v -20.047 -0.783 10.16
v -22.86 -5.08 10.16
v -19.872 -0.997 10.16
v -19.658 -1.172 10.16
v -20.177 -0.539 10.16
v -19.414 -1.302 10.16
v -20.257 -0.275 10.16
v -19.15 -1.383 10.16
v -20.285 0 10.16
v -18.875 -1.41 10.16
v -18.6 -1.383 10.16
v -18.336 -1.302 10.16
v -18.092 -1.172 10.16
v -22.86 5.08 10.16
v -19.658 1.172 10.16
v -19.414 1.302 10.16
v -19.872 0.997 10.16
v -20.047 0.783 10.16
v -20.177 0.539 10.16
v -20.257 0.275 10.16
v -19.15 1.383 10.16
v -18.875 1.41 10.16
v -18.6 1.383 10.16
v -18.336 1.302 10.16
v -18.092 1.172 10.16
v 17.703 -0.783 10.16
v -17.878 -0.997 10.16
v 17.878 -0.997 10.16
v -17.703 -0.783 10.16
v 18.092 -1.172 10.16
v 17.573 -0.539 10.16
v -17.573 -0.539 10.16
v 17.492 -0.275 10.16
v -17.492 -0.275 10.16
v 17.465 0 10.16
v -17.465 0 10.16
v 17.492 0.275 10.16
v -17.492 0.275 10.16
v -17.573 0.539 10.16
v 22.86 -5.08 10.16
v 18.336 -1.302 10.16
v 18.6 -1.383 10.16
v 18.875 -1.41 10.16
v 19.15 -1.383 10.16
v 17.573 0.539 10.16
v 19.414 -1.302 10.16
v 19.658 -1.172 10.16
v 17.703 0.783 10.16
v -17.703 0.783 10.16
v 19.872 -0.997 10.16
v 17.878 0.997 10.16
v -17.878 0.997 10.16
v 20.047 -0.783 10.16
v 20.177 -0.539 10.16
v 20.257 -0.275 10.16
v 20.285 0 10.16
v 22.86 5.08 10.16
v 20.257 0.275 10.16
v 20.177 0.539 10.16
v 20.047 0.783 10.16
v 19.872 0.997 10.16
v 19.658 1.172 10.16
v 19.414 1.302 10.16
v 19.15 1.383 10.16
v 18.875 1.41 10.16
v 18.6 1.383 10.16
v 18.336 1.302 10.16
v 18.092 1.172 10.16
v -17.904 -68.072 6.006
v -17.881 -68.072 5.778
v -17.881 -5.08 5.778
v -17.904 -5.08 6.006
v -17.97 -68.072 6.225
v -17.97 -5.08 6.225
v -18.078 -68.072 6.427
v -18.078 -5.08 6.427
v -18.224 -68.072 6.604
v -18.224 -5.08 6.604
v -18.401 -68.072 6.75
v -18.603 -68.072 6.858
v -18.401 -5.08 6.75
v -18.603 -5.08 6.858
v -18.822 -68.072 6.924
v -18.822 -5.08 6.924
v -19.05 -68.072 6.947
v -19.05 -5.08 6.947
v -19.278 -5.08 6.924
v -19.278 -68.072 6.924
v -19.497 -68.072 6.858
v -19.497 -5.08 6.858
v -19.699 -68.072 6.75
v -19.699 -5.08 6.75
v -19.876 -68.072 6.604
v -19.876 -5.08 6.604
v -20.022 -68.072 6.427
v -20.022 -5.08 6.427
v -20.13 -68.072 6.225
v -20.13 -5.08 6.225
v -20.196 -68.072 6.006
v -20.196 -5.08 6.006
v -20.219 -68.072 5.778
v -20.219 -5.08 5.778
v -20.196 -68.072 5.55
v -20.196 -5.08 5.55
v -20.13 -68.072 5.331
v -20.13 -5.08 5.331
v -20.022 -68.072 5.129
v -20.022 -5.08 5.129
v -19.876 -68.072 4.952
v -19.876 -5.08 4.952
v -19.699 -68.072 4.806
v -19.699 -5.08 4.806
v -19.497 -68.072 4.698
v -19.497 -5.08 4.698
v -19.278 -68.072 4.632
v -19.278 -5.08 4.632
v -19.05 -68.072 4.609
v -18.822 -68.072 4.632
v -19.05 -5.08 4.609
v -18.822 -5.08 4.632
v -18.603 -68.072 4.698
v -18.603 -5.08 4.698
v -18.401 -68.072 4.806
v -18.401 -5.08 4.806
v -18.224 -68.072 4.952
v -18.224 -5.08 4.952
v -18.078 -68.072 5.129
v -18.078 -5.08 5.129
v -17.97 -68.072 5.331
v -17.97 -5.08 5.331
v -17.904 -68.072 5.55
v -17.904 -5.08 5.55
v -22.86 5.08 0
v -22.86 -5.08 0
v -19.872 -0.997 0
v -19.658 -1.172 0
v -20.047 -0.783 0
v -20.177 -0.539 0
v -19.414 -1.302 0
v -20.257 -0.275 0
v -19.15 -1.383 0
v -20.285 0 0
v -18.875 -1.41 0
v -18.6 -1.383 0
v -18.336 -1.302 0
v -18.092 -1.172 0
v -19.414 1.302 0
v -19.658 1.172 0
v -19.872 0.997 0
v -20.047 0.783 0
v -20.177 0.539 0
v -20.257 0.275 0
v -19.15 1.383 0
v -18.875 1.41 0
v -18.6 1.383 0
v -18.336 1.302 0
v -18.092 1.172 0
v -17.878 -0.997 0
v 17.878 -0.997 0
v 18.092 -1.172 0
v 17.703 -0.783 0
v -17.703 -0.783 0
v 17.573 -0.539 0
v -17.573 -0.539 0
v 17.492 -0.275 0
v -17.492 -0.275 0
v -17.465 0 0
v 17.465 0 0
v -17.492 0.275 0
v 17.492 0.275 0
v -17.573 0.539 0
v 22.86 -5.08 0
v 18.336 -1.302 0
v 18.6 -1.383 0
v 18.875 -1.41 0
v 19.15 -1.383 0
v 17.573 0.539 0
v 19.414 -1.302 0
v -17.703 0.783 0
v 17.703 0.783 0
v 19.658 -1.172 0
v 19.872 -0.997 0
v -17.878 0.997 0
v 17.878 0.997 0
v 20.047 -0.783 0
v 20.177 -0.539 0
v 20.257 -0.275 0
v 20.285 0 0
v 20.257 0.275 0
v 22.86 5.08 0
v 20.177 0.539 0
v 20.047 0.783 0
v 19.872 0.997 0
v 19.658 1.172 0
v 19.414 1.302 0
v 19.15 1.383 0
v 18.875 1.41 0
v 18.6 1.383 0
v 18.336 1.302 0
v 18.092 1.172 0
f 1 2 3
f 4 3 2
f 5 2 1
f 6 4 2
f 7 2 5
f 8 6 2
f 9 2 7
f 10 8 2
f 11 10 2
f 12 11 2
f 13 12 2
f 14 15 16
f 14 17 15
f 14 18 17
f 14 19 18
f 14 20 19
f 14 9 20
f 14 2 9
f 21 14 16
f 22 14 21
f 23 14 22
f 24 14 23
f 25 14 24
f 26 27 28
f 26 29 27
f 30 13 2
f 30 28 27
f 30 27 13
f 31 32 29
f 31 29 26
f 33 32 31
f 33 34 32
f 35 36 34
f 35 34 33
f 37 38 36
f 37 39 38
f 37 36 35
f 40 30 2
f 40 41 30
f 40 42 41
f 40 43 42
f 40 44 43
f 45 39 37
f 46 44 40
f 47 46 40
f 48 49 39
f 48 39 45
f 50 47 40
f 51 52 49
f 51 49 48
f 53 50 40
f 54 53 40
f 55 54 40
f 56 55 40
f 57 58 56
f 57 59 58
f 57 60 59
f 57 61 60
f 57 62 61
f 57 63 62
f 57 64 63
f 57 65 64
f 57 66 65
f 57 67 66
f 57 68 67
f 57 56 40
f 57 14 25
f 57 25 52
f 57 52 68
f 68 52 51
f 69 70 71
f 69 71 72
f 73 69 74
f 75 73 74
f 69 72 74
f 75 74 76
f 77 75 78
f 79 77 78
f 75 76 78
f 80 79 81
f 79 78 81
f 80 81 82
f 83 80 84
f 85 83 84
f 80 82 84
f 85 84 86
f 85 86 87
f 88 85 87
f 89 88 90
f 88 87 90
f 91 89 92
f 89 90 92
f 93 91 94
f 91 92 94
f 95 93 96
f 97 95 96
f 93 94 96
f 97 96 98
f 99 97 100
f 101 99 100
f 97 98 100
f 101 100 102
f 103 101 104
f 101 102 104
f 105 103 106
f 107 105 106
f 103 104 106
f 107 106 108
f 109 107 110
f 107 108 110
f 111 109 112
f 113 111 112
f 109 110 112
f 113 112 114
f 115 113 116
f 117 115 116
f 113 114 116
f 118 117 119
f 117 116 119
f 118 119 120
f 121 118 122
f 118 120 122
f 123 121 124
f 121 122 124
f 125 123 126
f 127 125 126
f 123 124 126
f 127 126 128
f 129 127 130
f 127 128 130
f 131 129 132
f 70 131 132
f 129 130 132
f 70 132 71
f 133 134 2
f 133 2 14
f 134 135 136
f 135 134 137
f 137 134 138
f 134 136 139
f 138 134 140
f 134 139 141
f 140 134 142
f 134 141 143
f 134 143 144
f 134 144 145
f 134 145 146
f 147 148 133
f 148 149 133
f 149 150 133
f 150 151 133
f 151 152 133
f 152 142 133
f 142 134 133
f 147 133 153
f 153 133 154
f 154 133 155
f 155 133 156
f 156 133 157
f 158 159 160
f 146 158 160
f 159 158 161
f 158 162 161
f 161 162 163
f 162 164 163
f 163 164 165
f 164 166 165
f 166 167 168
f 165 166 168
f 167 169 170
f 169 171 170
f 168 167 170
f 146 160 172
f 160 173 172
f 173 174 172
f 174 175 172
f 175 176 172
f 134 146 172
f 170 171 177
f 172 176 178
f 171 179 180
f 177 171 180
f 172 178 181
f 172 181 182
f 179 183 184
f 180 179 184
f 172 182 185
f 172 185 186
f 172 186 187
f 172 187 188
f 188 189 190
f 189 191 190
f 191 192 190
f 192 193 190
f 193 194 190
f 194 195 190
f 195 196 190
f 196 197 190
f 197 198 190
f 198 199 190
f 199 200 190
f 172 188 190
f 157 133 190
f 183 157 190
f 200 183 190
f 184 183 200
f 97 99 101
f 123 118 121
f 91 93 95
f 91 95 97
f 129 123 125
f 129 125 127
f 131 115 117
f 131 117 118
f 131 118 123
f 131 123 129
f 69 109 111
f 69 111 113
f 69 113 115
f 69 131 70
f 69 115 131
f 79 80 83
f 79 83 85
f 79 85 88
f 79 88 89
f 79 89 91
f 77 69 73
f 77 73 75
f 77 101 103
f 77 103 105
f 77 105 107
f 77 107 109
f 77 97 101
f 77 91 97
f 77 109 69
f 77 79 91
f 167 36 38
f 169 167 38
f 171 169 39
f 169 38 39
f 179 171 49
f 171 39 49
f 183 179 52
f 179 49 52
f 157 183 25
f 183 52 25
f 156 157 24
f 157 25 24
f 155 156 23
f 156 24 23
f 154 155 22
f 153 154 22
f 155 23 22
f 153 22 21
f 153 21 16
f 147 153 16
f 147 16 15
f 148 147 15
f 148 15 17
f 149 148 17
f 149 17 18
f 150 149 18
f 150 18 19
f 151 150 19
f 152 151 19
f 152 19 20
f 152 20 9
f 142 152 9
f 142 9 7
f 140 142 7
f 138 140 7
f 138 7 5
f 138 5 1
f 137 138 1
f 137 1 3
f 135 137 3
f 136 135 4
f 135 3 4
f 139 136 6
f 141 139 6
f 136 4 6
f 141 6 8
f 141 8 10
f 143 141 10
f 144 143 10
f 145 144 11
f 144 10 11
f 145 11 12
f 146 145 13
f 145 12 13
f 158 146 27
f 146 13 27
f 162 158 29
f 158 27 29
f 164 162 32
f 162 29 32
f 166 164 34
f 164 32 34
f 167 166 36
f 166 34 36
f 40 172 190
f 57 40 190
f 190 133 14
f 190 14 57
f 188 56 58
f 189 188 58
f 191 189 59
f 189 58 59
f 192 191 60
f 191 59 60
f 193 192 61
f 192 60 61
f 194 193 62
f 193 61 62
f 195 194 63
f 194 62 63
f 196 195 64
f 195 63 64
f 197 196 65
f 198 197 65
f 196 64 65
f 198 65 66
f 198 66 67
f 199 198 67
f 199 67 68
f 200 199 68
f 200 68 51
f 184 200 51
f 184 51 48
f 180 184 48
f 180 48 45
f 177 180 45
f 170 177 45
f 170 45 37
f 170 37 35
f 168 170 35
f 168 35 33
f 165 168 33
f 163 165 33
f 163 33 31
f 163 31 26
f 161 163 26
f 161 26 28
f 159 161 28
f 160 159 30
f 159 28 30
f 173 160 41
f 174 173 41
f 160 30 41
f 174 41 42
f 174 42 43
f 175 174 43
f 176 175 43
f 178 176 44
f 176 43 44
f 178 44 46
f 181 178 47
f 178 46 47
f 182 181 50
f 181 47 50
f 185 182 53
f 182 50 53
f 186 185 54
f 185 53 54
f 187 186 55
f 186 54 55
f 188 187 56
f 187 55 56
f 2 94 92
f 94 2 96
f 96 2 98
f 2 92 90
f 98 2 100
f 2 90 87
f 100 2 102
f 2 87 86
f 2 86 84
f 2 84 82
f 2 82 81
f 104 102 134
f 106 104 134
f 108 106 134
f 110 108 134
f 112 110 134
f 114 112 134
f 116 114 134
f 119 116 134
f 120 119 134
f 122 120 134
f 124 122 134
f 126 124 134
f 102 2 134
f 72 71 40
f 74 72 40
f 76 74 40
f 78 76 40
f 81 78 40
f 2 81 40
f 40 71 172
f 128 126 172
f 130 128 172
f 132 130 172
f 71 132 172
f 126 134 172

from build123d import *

# Parameters (mm, degrees)
F0_W     = 45.72
F0_H     = 10.16
F1_DEPTH = 10.16
F2_R     = 1.409591
F3_DEPTH = 25.4
F4_R     = 1.168764
F5_DEPTH = 62.992


with BuildPart() as f1:
    # F0 (on Top) → F1 (new body)
    with BuildSketch(Plane.XY):
        Rectangle(F0_W, F0_H)
    extrude(amount=F1_DEPTH)

    # F2 (on face) → F3 (cut)
    with BuildSketch(Plane.XY.offset(10.16)):
        with Locations((-18.874988, 0)):
            Circle(F2_R)
        with Locations((18.874988, 0)):
            Circle(F2_R)
    extrude(amount=-F3_DEPTH, mode=Mode.SUBTRACT)

    # F4 (on face) → F5 (join)
    with BuildSketch(Plane.XZ.offset(5.08)):
        with Locations((-19.05, 5.778021)):
            Circle(F4_R)
    extrude(amount=F5_DEPTH)


solid = f1.part
